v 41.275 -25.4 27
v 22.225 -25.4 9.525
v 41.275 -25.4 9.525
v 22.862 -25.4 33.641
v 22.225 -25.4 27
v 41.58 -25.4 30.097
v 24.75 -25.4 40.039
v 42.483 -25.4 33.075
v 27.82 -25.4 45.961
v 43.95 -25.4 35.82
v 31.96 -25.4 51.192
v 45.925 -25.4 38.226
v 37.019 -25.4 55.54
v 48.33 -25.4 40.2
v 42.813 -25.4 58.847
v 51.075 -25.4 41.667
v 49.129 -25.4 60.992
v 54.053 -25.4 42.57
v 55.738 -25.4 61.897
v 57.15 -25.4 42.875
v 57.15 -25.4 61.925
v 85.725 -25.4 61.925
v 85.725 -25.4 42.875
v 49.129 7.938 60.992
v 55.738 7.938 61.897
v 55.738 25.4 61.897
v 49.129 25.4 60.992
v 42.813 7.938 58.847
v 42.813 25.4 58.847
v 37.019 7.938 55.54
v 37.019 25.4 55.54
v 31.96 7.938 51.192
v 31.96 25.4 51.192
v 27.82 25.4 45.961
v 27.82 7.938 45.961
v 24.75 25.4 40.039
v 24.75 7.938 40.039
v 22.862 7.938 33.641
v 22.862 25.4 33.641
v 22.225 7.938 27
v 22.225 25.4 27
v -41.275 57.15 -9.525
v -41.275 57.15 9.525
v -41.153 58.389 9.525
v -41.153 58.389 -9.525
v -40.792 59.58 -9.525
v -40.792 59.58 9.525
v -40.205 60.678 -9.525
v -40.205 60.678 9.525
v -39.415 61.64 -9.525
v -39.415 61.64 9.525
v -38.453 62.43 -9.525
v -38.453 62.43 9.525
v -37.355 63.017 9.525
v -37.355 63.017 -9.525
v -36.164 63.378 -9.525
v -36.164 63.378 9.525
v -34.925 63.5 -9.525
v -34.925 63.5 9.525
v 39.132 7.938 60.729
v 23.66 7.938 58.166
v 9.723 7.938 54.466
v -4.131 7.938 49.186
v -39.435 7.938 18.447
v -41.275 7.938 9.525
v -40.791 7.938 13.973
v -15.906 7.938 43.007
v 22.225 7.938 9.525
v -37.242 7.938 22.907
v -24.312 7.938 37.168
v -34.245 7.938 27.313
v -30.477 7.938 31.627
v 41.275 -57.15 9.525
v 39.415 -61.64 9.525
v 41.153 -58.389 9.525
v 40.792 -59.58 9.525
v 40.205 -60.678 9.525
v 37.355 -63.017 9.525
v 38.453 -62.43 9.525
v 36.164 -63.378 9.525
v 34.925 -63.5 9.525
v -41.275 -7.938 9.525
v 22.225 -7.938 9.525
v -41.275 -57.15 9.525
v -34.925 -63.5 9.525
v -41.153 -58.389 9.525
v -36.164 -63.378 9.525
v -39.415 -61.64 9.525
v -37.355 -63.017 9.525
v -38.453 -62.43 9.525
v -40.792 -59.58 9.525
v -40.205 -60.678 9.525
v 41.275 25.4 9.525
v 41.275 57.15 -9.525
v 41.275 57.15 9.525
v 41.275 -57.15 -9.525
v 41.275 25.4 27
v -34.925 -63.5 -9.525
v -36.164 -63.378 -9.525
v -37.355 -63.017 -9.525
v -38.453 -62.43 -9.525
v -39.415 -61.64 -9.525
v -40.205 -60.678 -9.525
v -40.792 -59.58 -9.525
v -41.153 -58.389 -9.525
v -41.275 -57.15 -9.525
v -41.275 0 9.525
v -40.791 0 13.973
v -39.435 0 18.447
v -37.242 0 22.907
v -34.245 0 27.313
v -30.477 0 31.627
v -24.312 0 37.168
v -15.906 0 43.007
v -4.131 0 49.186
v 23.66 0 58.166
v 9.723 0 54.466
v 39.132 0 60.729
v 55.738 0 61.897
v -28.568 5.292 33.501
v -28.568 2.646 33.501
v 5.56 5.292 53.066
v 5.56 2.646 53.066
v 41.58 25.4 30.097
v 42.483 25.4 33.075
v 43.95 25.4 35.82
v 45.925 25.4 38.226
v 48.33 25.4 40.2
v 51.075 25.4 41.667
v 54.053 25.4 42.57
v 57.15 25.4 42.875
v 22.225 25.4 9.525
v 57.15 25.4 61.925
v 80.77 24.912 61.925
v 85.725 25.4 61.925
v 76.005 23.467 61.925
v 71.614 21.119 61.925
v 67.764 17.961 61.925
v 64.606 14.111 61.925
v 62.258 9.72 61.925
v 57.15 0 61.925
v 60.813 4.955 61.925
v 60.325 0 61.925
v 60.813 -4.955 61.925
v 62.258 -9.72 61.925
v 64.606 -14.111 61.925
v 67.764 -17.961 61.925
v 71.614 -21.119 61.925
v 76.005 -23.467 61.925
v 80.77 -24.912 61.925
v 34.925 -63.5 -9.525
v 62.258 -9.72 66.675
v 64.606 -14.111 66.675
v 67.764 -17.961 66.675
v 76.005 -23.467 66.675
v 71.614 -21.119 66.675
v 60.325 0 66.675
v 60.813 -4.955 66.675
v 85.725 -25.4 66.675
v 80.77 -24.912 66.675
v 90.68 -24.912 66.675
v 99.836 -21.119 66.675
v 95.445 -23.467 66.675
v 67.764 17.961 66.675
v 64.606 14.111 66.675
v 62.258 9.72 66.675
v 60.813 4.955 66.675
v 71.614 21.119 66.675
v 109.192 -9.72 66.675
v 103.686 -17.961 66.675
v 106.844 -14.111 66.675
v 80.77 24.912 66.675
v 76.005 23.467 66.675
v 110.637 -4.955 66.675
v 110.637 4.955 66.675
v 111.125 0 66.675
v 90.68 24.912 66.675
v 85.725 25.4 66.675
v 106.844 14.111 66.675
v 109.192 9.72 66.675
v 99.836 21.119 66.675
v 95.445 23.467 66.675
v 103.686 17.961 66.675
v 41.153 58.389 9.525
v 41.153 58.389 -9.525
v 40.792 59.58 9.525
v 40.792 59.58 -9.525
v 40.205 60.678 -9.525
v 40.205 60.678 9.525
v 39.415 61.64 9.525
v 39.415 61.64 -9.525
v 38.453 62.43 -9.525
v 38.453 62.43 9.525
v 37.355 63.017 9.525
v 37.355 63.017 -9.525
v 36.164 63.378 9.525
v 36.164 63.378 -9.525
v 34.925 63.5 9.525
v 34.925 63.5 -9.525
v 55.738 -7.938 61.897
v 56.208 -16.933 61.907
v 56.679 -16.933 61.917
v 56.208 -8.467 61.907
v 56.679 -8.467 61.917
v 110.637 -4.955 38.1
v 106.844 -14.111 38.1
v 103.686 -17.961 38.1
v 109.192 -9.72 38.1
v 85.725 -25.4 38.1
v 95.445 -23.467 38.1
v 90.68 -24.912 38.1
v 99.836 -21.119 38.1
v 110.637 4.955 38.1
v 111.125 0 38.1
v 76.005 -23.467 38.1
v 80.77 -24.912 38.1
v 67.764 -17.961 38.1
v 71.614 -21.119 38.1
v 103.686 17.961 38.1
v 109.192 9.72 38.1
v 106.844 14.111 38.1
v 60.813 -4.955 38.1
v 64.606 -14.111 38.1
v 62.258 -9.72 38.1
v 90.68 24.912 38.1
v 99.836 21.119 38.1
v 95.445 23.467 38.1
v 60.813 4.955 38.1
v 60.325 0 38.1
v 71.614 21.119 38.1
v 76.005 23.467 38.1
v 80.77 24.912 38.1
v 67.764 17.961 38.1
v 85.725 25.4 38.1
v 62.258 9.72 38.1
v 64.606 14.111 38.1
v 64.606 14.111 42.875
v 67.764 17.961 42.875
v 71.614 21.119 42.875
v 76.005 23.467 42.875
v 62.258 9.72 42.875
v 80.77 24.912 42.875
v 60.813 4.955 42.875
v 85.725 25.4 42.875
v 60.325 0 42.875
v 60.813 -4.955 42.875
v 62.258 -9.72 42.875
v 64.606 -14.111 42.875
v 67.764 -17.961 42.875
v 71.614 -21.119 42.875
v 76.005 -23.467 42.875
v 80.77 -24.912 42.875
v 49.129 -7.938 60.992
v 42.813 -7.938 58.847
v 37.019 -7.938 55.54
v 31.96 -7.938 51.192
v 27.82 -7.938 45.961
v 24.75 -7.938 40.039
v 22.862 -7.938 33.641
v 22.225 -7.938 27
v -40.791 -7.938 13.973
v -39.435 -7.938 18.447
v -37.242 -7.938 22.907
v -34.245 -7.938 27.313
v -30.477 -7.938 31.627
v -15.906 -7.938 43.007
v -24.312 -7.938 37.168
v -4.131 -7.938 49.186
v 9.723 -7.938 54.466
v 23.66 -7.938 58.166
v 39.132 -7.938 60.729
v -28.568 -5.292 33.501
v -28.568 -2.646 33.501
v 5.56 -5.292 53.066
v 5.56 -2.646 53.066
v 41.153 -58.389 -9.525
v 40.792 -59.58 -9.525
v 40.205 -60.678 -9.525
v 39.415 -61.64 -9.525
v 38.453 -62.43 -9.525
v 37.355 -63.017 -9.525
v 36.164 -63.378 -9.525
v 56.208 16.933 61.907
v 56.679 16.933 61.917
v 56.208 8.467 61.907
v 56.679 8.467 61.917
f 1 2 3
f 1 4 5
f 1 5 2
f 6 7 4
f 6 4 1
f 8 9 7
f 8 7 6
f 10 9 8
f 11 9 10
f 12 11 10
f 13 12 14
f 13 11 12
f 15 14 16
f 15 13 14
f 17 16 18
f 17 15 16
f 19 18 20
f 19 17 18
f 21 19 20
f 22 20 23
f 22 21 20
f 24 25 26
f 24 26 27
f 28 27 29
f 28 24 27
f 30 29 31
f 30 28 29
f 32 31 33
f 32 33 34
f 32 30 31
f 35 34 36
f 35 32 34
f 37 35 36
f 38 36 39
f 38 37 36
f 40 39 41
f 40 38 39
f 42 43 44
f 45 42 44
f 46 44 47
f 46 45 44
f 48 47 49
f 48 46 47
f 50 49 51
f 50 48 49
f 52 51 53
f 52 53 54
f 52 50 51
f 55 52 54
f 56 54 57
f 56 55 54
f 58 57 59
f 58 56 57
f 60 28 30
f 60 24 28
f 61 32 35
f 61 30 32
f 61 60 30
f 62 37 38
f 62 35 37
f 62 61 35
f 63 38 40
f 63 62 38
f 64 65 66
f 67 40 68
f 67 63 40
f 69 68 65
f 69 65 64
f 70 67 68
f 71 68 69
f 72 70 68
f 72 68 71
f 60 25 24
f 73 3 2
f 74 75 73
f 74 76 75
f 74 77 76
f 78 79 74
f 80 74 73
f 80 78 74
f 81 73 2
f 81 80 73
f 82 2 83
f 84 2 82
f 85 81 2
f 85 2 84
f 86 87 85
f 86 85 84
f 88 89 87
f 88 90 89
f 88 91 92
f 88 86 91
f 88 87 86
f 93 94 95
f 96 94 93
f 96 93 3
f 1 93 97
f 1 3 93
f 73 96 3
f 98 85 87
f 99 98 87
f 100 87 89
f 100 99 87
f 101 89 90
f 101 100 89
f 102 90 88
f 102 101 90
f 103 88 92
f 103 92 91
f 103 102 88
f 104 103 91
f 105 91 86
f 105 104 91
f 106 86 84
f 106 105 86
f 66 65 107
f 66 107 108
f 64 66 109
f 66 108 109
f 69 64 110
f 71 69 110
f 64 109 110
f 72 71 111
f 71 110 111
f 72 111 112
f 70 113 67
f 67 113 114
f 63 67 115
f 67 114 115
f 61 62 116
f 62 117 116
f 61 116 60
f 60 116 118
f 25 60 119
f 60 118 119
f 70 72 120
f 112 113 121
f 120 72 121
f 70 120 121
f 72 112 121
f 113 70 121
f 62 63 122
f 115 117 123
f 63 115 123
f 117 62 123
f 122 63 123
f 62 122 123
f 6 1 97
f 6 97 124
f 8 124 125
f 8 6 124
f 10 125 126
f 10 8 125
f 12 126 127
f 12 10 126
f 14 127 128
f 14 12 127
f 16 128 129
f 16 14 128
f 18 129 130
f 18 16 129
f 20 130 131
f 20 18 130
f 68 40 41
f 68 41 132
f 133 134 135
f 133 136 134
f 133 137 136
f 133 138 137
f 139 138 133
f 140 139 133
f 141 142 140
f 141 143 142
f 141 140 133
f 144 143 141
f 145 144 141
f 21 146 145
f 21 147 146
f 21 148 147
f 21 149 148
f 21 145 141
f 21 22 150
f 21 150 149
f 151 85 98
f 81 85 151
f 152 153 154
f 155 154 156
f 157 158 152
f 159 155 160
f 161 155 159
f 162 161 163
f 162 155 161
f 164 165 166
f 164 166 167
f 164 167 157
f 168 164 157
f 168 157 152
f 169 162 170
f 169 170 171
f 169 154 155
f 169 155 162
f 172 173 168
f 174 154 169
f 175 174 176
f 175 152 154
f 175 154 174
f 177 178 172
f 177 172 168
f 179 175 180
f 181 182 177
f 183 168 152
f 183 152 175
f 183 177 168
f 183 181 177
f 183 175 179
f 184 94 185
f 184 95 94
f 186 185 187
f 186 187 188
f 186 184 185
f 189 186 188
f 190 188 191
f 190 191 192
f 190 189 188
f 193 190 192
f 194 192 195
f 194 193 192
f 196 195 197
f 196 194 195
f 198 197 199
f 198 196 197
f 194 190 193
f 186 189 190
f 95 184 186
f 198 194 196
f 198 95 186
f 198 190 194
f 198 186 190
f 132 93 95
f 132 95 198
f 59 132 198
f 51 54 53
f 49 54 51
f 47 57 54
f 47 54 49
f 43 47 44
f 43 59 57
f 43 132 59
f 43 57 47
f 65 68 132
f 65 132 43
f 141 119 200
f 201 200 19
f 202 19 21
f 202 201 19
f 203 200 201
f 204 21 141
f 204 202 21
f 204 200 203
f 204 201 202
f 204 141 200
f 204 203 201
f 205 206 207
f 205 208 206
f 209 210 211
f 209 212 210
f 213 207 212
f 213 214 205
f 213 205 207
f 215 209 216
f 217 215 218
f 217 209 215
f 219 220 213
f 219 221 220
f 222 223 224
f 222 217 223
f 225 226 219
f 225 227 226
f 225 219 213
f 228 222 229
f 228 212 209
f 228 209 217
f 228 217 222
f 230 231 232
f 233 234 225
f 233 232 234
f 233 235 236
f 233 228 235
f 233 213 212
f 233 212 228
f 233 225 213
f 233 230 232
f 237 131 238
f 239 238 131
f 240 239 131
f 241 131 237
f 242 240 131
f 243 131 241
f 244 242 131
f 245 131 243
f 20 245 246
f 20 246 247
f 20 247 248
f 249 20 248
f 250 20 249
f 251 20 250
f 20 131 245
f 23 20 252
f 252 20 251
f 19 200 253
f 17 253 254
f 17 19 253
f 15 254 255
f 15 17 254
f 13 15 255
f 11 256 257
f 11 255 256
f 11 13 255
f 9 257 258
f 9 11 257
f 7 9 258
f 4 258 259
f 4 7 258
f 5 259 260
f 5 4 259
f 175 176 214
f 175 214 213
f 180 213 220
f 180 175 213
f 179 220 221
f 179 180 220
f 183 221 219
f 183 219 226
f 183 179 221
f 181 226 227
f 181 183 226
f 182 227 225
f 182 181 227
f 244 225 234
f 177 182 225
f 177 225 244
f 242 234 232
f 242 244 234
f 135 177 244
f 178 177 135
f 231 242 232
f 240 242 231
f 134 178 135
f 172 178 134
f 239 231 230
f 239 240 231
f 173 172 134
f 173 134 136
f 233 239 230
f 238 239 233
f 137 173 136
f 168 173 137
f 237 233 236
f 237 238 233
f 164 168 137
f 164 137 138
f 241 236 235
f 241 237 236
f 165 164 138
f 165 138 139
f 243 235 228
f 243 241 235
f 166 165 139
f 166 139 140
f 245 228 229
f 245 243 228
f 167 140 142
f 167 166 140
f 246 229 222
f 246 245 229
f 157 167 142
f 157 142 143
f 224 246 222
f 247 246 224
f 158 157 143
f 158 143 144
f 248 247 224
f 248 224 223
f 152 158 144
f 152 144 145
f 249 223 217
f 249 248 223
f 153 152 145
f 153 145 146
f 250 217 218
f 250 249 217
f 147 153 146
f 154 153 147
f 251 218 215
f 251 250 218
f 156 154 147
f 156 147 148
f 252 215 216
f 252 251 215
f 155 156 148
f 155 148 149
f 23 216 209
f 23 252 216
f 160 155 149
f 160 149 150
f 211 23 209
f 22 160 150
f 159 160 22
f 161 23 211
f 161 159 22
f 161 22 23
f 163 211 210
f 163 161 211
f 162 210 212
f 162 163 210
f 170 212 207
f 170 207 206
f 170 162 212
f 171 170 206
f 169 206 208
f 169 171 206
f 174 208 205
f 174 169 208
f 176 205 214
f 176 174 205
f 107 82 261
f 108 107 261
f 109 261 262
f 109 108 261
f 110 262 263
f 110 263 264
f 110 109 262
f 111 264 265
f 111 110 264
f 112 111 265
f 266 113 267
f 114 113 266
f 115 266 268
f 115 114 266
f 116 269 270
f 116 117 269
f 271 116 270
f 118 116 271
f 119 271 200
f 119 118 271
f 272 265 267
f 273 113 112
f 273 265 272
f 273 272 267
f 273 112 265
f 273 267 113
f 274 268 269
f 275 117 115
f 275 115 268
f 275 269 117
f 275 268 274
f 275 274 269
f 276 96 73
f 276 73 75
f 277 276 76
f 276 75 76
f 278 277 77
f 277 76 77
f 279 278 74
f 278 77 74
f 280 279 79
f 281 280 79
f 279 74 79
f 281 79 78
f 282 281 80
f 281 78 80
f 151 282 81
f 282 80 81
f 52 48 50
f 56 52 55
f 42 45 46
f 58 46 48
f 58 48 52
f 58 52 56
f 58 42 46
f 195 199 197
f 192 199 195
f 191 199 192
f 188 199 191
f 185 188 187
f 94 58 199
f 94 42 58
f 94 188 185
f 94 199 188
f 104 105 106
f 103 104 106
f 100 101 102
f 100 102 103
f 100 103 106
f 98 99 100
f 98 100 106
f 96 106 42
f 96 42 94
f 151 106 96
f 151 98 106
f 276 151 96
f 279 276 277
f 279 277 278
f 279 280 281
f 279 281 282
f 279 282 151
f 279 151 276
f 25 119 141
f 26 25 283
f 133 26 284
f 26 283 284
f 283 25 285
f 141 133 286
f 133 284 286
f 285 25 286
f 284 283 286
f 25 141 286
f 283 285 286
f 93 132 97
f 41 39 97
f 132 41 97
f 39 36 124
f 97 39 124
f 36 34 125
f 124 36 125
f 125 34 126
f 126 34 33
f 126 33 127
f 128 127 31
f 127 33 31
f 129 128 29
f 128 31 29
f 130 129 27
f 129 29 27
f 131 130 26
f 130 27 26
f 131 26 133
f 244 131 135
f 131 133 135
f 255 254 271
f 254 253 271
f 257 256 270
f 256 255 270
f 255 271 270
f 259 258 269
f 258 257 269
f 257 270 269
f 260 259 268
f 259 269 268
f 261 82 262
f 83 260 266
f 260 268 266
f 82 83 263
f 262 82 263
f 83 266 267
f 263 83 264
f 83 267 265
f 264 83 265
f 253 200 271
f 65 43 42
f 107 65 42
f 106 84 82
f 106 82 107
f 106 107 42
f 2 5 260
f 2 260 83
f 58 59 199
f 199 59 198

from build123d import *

# Parameters (mm, degrees)
F1_DEPTH = 63.5
F2_DEPTH = 25.4
F3_DEPTH = 7.9375
F5_R     = 6.35


with BuildPart() as f1:
    # F0 (on Front) → F1 (new body, symmetric)
    with BuildSketch(Plane.XZ):
        Polygon((-41.275, 9.525), (-41.275, -9.525), (41.275, -9.525), (41.275, 9.525), (22.225, 9.525), align=None)
    extrude(amount=F1_DEPTH, both=True)

    # F0 (on Front) → F2 (join, symmetric)
    with BuildSketch(Plane.XZ):
        with BuildLine():
            Line((22.225, 9.525), (41.275, 9.525))
            Line((41.275, 9.525), (41.275, 27.0002))
            ThreePointArc((41.275, 27.0002), (45.92468, 38.22552), (57.15, 42.8752))
            Line((57.15, 42.8752), (60.325, 42.8752))
            Line((60.325, 42.8752), (60.325, 61.9252))
            Line((60.325, 61.9252), (57.15, 61.9252))
            add(Edge.make_bspline(
                [(55.738204, 61.896653), (56.207698, 61.907946), (56.678301, 61.917467), (57.15, 61.9252)],
                knots=[110.584211, 110.584211, 110.584211, 110.584211, 111.504536, 111.504536, 111.504536, 111.504536], degree=3))
            ThreePointArc((55.738204, 61.896653), (31.960095, 51.19161), (22.225, 27.0002))
            Line((22.225, 27.0002), (22.225, 9.525))
        make_face()
        Polygon((85.725, 61.9252), (60.325, 61.9252), (60.325, 42.8752), (85.725, 42.8752), (85.725, 52.3875), align=None)
    extrude(amount=F2_DEPTH, both=True)

    # F0 (on Front) → F3 (join, symmetric)
    with BuildSketch(Plane.XZ):
        with BuildLine():
            add(Edge.make_bspline(
                [(-41.275, 9.525), (-41.068148, 33.600268), (-0.675116, 60.539722), (55.738204, 61.896653)],
                knots=[0, 0, 0, 0, 110.584211, 110.584211, 110.584211, 110.584211], degree=3))
            Line((-41.275, 9.525), (22.225, 9.525))
            Line((22.225, 9.525), (22.225, 27.0002))
            ThreePointArc((22.225, 27.0002), (31.960095, 51.19161), (55.738204, 61.896653))
        make_face()
    extrude(amount=F3_DEPTH, both=True)

    # F0 (on Front) → F4 (revolve)
    with BuildSketch(Plane.XZ):
        Polygon((85.725, 66.675), (85.725, 61.9252), (85.725, 52.3875), (85.725, 42.8752), (85.725, 38.1), (111.125, 38.1), (111.125, 66.675), align=None)
    revolve(axis=Axis((85.725, 0, 57.15635), (0, 0, 1)))

    # F5
    f5_edges = [f1.edges().sort_by_distance(p)[0] for p in [
        (41.275, 63.5, 0),
        (-41.275, 63.5, 0),
        (41.275, -63.5, 0),
        (-41.275, -63.5, 0),
    ]]
    fillet(f5_edges, radius=F5_R)


solid = f1.part
